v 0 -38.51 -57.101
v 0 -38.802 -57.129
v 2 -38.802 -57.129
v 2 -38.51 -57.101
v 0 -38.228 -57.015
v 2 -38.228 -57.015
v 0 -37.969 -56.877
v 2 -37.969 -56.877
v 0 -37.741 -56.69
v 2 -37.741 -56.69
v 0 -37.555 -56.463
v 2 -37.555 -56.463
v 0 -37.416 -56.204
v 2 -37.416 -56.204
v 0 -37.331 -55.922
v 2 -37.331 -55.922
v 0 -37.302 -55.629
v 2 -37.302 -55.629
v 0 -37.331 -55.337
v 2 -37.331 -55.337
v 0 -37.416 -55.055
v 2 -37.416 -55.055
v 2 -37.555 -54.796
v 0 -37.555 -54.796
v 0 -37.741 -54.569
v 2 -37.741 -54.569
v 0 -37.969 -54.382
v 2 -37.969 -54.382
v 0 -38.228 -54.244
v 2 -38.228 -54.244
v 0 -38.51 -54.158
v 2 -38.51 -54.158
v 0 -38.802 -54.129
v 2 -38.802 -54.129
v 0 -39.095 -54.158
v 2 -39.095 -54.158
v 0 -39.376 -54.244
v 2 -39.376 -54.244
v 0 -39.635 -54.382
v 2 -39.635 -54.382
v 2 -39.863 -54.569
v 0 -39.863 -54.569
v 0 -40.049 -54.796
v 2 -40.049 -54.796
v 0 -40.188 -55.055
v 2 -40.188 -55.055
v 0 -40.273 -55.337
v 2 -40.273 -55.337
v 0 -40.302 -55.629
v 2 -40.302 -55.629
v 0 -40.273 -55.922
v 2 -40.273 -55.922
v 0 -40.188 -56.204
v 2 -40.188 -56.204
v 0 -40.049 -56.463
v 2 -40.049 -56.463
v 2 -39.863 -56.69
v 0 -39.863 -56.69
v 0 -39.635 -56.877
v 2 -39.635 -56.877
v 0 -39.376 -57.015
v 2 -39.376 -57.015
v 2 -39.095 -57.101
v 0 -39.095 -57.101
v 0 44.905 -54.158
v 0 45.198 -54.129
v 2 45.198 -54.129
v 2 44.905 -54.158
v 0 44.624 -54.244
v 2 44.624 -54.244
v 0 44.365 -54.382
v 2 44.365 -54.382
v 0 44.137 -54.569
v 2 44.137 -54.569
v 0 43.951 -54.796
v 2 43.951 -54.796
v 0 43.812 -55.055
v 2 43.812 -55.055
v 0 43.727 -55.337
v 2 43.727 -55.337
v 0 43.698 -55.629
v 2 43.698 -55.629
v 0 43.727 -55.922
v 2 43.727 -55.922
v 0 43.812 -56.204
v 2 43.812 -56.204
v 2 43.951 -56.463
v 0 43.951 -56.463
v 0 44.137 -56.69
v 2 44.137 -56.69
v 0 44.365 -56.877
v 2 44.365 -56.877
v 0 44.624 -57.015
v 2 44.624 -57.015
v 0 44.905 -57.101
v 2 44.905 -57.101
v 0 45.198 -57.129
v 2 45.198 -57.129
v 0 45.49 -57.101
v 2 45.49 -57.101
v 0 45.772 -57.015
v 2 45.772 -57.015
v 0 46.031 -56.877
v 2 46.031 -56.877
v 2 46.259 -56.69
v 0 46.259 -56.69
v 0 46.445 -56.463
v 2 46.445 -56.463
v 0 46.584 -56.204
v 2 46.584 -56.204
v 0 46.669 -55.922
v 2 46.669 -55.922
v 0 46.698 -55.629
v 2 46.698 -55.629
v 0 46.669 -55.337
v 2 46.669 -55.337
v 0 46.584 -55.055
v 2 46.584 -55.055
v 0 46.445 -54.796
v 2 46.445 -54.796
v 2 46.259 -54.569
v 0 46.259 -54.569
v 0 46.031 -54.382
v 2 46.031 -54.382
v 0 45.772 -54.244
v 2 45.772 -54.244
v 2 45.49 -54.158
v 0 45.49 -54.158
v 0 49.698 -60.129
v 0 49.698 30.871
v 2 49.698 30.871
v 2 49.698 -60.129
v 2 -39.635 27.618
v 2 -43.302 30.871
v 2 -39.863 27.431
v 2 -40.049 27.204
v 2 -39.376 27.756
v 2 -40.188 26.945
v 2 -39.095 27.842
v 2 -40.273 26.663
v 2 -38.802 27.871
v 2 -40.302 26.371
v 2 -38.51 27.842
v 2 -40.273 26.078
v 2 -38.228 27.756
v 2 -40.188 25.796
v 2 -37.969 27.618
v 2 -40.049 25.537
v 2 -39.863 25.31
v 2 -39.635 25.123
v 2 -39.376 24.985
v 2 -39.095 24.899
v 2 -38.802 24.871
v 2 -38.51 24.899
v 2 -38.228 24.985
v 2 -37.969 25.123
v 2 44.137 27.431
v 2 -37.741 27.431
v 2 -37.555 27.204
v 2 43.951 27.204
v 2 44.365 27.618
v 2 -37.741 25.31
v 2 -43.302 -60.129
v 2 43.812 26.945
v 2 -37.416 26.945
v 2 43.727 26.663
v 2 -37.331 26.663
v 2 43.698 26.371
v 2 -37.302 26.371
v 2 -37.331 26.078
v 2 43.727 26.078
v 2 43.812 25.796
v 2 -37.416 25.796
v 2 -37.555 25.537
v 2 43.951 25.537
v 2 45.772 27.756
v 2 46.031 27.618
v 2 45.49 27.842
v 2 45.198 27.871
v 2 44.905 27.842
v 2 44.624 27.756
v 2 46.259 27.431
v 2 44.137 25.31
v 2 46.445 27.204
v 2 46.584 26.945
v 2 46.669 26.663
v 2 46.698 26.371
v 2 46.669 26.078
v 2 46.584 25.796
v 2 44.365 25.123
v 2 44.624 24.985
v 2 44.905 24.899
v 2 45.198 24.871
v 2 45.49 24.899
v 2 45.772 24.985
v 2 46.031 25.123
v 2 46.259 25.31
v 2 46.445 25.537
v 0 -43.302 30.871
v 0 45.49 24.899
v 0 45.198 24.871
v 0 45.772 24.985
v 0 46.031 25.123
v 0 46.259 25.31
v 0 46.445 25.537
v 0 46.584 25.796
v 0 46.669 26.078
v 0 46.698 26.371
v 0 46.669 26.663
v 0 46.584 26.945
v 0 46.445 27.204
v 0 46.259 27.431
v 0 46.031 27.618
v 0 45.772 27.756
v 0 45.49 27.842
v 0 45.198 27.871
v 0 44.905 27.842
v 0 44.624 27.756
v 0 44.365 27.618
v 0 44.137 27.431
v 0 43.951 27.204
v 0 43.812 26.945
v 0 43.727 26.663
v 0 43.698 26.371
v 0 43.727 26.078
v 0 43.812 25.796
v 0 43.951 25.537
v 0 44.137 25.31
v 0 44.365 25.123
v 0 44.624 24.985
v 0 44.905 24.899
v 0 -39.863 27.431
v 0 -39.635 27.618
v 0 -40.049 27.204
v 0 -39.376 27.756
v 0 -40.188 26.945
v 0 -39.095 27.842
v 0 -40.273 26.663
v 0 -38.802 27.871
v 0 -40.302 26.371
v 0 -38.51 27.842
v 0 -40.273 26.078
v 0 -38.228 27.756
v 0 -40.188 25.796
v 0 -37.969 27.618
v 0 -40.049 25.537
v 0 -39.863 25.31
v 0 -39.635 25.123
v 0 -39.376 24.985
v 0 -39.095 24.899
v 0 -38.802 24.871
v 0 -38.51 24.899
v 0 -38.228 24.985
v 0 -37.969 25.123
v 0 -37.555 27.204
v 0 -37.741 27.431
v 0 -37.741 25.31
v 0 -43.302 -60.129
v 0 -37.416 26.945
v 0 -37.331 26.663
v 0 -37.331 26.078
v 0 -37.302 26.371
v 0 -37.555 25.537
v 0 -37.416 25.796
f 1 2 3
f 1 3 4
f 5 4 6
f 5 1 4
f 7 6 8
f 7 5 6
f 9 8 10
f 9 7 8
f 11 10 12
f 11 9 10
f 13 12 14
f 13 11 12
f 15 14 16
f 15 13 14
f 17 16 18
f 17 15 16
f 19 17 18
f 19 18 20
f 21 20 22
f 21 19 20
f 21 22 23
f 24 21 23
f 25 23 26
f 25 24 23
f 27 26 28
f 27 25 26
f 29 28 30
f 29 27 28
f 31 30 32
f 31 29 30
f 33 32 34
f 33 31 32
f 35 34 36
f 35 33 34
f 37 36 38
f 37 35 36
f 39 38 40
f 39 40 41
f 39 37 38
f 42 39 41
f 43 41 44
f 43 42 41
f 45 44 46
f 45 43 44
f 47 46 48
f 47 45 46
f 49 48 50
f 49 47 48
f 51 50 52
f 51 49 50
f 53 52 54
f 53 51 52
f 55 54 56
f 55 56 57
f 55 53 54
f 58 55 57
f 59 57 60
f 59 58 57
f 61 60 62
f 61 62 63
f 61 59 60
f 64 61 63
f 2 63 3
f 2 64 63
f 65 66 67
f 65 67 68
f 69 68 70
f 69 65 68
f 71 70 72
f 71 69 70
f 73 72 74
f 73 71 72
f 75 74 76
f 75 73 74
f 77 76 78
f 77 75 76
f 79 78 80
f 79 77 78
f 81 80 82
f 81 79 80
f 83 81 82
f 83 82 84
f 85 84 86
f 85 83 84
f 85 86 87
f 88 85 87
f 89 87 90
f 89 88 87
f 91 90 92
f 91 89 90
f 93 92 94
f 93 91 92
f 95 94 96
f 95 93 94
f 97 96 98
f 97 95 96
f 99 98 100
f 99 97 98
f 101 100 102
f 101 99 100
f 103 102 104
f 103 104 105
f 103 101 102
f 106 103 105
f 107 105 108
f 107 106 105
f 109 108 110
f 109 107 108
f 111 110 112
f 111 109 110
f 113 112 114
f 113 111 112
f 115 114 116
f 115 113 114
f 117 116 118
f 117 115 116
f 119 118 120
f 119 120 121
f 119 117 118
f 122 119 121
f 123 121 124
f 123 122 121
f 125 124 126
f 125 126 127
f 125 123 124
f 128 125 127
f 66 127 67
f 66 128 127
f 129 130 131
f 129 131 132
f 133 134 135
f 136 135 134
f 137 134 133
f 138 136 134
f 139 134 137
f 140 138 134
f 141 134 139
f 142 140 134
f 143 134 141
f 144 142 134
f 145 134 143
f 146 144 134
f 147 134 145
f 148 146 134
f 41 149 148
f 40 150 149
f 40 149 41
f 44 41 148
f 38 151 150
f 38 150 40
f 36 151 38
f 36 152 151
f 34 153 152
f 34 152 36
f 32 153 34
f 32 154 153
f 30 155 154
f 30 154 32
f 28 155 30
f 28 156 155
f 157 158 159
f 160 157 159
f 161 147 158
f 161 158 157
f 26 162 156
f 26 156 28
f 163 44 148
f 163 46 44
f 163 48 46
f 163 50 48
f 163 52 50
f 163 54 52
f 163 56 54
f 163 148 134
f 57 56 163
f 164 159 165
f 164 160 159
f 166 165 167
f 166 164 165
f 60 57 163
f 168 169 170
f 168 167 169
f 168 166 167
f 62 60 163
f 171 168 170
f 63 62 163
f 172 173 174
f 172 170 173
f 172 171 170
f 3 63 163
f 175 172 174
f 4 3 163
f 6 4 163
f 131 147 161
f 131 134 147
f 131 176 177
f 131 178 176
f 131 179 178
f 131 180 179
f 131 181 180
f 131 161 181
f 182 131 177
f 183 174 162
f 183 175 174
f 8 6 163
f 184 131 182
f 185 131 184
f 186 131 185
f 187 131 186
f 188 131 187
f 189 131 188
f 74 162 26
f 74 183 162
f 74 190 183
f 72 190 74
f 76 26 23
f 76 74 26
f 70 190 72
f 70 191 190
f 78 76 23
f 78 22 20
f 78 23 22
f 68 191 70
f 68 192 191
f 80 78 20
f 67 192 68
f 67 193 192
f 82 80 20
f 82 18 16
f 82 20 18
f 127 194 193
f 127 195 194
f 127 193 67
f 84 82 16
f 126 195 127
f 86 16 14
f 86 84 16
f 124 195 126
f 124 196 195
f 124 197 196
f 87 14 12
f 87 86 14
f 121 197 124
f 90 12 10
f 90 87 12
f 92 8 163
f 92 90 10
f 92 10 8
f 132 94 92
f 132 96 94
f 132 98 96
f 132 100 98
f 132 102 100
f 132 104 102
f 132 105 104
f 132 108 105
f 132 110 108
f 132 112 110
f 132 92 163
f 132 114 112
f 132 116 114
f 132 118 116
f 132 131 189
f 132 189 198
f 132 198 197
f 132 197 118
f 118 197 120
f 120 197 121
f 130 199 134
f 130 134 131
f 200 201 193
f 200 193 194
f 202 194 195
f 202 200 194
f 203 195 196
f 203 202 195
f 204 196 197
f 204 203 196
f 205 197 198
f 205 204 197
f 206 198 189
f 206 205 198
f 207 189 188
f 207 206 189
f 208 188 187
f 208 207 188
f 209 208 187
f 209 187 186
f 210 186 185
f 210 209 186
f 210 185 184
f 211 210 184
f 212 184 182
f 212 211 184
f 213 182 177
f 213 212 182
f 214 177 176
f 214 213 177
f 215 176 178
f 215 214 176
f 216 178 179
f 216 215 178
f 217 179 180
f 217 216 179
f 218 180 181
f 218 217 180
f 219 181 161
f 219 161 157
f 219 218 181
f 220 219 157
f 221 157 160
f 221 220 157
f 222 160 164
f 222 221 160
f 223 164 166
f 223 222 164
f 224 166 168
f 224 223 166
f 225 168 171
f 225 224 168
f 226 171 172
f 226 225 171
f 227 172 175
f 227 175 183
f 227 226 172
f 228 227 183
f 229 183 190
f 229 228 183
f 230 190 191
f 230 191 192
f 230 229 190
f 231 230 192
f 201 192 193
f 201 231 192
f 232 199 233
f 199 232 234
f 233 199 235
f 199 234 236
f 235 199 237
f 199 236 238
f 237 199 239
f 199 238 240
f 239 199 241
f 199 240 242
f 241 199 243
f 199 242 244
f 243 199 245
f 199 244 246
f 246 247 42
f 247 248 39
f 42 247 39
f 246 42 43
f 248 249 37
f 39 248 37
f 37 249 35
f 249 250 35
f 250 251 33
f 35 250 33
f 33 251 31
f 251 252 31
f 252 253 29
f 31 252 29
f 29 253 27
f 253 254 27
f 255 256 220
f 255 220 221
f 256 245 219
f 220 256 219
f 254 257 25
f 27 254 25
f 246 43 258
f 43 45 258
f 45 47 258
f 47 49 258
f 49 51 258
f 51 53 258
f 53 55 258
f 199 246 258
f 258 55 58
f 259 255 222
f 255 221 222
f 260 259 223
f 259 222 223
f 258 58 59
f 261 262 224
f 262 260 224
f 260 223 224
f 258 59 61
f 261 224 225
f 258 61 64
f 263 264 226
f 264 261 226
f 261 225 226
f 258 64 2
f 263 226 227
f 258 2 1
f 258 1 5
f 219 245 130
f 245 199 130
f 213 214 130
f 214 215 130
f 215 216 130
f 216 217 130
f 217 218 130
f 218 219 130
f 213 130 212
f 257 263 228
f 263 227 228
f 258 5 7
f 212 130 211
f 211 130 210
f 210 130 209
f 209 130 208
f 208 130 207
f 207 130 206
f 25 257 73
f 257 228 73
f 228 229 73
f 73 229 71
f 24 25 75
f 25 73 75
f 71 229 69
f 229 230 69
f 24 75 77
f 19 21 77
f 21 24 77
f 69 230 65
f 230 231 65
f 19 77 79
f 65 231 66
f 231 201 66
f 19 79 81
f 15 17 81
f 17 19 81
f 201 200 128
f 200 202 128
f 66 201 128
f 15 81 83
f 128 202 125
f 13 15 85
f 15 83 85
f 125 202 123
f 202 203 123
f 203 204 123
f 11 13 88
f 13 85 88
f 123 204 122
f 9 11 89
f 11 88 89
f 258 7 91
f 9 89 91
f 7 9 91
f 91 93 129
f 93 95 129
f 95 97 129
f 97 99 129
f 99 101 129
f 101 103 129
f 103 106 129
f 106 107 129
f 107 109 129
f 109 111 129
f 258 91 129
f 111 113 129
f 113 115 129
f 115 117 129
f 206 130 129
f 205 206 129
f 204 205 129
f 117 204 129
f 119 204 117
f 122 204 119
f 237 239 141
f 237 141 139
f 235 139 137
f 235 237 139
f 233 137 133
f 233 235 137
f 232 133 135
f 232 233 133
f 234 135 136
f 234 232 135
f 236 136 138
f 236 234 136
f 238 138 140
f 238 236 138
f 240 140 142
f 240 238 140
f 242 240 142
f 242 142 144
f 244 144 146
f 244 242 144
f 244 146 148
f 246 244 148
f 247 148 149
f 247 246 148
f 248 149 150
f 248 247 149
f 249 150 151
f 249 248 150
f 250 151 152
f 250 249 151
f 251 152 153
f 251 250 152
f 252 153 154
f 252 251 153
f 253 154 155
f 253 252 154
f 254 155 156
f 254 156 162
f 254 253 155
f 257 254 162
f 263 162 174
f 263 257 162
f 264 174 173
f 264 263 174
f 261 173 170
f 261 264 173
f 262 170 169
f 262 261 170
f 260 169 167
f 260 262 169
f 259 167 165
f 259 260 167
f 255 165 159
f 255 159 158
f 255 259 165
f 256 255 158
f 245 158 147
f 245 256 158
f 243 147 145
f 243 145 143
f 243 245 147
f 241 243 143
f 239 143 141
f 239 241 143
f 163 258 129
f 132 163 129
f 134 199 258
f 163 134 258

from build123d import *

# Parameters (mm, degrees)
SKETCH_1_W      = 91
SKETCH_1_H      = 93
SKETCH_1_R      = 1.5
EXTRUDE_1_DEPTH = 2


with BuildPart() as part:
    # Эскиз1 → Бобышка-Вытянуть1 (new body)
    with BuildSketch(Plane(origin=(0, 0, 0), x_dir=(0, 0, -1), z_dir=(1, 0, 0))):
        with Locations((14.629493357, 3.197856898)):
            Rectangle(SKETCH_1_W, SKETCH_1_H)
        with Locations((-26.370506643, 45.197856898)):
            Circle(SKETCH_1_R, mode=Mode.SUBTRACT)
        with Locations(Location((55.629493357, 45.197856898, 0), (0, 0, 180))):
            Circle(SKETCH_1_R, mode=Mode.SUBTRACT)
        with Locations((55.629493357, -38.802143102)):
            Circle(SKETCH_1_R, mode=Mode.SUBTRACT)
        with Locations(Location((-26.370506643, -38.802143102, 0), (0, 0, 180))):
            Circle(SKETCH_1_R, mode=Mode.SUBTRACT)
    extrude(amount=EXTRUDE_1_DEPTH)


solid = part.part
